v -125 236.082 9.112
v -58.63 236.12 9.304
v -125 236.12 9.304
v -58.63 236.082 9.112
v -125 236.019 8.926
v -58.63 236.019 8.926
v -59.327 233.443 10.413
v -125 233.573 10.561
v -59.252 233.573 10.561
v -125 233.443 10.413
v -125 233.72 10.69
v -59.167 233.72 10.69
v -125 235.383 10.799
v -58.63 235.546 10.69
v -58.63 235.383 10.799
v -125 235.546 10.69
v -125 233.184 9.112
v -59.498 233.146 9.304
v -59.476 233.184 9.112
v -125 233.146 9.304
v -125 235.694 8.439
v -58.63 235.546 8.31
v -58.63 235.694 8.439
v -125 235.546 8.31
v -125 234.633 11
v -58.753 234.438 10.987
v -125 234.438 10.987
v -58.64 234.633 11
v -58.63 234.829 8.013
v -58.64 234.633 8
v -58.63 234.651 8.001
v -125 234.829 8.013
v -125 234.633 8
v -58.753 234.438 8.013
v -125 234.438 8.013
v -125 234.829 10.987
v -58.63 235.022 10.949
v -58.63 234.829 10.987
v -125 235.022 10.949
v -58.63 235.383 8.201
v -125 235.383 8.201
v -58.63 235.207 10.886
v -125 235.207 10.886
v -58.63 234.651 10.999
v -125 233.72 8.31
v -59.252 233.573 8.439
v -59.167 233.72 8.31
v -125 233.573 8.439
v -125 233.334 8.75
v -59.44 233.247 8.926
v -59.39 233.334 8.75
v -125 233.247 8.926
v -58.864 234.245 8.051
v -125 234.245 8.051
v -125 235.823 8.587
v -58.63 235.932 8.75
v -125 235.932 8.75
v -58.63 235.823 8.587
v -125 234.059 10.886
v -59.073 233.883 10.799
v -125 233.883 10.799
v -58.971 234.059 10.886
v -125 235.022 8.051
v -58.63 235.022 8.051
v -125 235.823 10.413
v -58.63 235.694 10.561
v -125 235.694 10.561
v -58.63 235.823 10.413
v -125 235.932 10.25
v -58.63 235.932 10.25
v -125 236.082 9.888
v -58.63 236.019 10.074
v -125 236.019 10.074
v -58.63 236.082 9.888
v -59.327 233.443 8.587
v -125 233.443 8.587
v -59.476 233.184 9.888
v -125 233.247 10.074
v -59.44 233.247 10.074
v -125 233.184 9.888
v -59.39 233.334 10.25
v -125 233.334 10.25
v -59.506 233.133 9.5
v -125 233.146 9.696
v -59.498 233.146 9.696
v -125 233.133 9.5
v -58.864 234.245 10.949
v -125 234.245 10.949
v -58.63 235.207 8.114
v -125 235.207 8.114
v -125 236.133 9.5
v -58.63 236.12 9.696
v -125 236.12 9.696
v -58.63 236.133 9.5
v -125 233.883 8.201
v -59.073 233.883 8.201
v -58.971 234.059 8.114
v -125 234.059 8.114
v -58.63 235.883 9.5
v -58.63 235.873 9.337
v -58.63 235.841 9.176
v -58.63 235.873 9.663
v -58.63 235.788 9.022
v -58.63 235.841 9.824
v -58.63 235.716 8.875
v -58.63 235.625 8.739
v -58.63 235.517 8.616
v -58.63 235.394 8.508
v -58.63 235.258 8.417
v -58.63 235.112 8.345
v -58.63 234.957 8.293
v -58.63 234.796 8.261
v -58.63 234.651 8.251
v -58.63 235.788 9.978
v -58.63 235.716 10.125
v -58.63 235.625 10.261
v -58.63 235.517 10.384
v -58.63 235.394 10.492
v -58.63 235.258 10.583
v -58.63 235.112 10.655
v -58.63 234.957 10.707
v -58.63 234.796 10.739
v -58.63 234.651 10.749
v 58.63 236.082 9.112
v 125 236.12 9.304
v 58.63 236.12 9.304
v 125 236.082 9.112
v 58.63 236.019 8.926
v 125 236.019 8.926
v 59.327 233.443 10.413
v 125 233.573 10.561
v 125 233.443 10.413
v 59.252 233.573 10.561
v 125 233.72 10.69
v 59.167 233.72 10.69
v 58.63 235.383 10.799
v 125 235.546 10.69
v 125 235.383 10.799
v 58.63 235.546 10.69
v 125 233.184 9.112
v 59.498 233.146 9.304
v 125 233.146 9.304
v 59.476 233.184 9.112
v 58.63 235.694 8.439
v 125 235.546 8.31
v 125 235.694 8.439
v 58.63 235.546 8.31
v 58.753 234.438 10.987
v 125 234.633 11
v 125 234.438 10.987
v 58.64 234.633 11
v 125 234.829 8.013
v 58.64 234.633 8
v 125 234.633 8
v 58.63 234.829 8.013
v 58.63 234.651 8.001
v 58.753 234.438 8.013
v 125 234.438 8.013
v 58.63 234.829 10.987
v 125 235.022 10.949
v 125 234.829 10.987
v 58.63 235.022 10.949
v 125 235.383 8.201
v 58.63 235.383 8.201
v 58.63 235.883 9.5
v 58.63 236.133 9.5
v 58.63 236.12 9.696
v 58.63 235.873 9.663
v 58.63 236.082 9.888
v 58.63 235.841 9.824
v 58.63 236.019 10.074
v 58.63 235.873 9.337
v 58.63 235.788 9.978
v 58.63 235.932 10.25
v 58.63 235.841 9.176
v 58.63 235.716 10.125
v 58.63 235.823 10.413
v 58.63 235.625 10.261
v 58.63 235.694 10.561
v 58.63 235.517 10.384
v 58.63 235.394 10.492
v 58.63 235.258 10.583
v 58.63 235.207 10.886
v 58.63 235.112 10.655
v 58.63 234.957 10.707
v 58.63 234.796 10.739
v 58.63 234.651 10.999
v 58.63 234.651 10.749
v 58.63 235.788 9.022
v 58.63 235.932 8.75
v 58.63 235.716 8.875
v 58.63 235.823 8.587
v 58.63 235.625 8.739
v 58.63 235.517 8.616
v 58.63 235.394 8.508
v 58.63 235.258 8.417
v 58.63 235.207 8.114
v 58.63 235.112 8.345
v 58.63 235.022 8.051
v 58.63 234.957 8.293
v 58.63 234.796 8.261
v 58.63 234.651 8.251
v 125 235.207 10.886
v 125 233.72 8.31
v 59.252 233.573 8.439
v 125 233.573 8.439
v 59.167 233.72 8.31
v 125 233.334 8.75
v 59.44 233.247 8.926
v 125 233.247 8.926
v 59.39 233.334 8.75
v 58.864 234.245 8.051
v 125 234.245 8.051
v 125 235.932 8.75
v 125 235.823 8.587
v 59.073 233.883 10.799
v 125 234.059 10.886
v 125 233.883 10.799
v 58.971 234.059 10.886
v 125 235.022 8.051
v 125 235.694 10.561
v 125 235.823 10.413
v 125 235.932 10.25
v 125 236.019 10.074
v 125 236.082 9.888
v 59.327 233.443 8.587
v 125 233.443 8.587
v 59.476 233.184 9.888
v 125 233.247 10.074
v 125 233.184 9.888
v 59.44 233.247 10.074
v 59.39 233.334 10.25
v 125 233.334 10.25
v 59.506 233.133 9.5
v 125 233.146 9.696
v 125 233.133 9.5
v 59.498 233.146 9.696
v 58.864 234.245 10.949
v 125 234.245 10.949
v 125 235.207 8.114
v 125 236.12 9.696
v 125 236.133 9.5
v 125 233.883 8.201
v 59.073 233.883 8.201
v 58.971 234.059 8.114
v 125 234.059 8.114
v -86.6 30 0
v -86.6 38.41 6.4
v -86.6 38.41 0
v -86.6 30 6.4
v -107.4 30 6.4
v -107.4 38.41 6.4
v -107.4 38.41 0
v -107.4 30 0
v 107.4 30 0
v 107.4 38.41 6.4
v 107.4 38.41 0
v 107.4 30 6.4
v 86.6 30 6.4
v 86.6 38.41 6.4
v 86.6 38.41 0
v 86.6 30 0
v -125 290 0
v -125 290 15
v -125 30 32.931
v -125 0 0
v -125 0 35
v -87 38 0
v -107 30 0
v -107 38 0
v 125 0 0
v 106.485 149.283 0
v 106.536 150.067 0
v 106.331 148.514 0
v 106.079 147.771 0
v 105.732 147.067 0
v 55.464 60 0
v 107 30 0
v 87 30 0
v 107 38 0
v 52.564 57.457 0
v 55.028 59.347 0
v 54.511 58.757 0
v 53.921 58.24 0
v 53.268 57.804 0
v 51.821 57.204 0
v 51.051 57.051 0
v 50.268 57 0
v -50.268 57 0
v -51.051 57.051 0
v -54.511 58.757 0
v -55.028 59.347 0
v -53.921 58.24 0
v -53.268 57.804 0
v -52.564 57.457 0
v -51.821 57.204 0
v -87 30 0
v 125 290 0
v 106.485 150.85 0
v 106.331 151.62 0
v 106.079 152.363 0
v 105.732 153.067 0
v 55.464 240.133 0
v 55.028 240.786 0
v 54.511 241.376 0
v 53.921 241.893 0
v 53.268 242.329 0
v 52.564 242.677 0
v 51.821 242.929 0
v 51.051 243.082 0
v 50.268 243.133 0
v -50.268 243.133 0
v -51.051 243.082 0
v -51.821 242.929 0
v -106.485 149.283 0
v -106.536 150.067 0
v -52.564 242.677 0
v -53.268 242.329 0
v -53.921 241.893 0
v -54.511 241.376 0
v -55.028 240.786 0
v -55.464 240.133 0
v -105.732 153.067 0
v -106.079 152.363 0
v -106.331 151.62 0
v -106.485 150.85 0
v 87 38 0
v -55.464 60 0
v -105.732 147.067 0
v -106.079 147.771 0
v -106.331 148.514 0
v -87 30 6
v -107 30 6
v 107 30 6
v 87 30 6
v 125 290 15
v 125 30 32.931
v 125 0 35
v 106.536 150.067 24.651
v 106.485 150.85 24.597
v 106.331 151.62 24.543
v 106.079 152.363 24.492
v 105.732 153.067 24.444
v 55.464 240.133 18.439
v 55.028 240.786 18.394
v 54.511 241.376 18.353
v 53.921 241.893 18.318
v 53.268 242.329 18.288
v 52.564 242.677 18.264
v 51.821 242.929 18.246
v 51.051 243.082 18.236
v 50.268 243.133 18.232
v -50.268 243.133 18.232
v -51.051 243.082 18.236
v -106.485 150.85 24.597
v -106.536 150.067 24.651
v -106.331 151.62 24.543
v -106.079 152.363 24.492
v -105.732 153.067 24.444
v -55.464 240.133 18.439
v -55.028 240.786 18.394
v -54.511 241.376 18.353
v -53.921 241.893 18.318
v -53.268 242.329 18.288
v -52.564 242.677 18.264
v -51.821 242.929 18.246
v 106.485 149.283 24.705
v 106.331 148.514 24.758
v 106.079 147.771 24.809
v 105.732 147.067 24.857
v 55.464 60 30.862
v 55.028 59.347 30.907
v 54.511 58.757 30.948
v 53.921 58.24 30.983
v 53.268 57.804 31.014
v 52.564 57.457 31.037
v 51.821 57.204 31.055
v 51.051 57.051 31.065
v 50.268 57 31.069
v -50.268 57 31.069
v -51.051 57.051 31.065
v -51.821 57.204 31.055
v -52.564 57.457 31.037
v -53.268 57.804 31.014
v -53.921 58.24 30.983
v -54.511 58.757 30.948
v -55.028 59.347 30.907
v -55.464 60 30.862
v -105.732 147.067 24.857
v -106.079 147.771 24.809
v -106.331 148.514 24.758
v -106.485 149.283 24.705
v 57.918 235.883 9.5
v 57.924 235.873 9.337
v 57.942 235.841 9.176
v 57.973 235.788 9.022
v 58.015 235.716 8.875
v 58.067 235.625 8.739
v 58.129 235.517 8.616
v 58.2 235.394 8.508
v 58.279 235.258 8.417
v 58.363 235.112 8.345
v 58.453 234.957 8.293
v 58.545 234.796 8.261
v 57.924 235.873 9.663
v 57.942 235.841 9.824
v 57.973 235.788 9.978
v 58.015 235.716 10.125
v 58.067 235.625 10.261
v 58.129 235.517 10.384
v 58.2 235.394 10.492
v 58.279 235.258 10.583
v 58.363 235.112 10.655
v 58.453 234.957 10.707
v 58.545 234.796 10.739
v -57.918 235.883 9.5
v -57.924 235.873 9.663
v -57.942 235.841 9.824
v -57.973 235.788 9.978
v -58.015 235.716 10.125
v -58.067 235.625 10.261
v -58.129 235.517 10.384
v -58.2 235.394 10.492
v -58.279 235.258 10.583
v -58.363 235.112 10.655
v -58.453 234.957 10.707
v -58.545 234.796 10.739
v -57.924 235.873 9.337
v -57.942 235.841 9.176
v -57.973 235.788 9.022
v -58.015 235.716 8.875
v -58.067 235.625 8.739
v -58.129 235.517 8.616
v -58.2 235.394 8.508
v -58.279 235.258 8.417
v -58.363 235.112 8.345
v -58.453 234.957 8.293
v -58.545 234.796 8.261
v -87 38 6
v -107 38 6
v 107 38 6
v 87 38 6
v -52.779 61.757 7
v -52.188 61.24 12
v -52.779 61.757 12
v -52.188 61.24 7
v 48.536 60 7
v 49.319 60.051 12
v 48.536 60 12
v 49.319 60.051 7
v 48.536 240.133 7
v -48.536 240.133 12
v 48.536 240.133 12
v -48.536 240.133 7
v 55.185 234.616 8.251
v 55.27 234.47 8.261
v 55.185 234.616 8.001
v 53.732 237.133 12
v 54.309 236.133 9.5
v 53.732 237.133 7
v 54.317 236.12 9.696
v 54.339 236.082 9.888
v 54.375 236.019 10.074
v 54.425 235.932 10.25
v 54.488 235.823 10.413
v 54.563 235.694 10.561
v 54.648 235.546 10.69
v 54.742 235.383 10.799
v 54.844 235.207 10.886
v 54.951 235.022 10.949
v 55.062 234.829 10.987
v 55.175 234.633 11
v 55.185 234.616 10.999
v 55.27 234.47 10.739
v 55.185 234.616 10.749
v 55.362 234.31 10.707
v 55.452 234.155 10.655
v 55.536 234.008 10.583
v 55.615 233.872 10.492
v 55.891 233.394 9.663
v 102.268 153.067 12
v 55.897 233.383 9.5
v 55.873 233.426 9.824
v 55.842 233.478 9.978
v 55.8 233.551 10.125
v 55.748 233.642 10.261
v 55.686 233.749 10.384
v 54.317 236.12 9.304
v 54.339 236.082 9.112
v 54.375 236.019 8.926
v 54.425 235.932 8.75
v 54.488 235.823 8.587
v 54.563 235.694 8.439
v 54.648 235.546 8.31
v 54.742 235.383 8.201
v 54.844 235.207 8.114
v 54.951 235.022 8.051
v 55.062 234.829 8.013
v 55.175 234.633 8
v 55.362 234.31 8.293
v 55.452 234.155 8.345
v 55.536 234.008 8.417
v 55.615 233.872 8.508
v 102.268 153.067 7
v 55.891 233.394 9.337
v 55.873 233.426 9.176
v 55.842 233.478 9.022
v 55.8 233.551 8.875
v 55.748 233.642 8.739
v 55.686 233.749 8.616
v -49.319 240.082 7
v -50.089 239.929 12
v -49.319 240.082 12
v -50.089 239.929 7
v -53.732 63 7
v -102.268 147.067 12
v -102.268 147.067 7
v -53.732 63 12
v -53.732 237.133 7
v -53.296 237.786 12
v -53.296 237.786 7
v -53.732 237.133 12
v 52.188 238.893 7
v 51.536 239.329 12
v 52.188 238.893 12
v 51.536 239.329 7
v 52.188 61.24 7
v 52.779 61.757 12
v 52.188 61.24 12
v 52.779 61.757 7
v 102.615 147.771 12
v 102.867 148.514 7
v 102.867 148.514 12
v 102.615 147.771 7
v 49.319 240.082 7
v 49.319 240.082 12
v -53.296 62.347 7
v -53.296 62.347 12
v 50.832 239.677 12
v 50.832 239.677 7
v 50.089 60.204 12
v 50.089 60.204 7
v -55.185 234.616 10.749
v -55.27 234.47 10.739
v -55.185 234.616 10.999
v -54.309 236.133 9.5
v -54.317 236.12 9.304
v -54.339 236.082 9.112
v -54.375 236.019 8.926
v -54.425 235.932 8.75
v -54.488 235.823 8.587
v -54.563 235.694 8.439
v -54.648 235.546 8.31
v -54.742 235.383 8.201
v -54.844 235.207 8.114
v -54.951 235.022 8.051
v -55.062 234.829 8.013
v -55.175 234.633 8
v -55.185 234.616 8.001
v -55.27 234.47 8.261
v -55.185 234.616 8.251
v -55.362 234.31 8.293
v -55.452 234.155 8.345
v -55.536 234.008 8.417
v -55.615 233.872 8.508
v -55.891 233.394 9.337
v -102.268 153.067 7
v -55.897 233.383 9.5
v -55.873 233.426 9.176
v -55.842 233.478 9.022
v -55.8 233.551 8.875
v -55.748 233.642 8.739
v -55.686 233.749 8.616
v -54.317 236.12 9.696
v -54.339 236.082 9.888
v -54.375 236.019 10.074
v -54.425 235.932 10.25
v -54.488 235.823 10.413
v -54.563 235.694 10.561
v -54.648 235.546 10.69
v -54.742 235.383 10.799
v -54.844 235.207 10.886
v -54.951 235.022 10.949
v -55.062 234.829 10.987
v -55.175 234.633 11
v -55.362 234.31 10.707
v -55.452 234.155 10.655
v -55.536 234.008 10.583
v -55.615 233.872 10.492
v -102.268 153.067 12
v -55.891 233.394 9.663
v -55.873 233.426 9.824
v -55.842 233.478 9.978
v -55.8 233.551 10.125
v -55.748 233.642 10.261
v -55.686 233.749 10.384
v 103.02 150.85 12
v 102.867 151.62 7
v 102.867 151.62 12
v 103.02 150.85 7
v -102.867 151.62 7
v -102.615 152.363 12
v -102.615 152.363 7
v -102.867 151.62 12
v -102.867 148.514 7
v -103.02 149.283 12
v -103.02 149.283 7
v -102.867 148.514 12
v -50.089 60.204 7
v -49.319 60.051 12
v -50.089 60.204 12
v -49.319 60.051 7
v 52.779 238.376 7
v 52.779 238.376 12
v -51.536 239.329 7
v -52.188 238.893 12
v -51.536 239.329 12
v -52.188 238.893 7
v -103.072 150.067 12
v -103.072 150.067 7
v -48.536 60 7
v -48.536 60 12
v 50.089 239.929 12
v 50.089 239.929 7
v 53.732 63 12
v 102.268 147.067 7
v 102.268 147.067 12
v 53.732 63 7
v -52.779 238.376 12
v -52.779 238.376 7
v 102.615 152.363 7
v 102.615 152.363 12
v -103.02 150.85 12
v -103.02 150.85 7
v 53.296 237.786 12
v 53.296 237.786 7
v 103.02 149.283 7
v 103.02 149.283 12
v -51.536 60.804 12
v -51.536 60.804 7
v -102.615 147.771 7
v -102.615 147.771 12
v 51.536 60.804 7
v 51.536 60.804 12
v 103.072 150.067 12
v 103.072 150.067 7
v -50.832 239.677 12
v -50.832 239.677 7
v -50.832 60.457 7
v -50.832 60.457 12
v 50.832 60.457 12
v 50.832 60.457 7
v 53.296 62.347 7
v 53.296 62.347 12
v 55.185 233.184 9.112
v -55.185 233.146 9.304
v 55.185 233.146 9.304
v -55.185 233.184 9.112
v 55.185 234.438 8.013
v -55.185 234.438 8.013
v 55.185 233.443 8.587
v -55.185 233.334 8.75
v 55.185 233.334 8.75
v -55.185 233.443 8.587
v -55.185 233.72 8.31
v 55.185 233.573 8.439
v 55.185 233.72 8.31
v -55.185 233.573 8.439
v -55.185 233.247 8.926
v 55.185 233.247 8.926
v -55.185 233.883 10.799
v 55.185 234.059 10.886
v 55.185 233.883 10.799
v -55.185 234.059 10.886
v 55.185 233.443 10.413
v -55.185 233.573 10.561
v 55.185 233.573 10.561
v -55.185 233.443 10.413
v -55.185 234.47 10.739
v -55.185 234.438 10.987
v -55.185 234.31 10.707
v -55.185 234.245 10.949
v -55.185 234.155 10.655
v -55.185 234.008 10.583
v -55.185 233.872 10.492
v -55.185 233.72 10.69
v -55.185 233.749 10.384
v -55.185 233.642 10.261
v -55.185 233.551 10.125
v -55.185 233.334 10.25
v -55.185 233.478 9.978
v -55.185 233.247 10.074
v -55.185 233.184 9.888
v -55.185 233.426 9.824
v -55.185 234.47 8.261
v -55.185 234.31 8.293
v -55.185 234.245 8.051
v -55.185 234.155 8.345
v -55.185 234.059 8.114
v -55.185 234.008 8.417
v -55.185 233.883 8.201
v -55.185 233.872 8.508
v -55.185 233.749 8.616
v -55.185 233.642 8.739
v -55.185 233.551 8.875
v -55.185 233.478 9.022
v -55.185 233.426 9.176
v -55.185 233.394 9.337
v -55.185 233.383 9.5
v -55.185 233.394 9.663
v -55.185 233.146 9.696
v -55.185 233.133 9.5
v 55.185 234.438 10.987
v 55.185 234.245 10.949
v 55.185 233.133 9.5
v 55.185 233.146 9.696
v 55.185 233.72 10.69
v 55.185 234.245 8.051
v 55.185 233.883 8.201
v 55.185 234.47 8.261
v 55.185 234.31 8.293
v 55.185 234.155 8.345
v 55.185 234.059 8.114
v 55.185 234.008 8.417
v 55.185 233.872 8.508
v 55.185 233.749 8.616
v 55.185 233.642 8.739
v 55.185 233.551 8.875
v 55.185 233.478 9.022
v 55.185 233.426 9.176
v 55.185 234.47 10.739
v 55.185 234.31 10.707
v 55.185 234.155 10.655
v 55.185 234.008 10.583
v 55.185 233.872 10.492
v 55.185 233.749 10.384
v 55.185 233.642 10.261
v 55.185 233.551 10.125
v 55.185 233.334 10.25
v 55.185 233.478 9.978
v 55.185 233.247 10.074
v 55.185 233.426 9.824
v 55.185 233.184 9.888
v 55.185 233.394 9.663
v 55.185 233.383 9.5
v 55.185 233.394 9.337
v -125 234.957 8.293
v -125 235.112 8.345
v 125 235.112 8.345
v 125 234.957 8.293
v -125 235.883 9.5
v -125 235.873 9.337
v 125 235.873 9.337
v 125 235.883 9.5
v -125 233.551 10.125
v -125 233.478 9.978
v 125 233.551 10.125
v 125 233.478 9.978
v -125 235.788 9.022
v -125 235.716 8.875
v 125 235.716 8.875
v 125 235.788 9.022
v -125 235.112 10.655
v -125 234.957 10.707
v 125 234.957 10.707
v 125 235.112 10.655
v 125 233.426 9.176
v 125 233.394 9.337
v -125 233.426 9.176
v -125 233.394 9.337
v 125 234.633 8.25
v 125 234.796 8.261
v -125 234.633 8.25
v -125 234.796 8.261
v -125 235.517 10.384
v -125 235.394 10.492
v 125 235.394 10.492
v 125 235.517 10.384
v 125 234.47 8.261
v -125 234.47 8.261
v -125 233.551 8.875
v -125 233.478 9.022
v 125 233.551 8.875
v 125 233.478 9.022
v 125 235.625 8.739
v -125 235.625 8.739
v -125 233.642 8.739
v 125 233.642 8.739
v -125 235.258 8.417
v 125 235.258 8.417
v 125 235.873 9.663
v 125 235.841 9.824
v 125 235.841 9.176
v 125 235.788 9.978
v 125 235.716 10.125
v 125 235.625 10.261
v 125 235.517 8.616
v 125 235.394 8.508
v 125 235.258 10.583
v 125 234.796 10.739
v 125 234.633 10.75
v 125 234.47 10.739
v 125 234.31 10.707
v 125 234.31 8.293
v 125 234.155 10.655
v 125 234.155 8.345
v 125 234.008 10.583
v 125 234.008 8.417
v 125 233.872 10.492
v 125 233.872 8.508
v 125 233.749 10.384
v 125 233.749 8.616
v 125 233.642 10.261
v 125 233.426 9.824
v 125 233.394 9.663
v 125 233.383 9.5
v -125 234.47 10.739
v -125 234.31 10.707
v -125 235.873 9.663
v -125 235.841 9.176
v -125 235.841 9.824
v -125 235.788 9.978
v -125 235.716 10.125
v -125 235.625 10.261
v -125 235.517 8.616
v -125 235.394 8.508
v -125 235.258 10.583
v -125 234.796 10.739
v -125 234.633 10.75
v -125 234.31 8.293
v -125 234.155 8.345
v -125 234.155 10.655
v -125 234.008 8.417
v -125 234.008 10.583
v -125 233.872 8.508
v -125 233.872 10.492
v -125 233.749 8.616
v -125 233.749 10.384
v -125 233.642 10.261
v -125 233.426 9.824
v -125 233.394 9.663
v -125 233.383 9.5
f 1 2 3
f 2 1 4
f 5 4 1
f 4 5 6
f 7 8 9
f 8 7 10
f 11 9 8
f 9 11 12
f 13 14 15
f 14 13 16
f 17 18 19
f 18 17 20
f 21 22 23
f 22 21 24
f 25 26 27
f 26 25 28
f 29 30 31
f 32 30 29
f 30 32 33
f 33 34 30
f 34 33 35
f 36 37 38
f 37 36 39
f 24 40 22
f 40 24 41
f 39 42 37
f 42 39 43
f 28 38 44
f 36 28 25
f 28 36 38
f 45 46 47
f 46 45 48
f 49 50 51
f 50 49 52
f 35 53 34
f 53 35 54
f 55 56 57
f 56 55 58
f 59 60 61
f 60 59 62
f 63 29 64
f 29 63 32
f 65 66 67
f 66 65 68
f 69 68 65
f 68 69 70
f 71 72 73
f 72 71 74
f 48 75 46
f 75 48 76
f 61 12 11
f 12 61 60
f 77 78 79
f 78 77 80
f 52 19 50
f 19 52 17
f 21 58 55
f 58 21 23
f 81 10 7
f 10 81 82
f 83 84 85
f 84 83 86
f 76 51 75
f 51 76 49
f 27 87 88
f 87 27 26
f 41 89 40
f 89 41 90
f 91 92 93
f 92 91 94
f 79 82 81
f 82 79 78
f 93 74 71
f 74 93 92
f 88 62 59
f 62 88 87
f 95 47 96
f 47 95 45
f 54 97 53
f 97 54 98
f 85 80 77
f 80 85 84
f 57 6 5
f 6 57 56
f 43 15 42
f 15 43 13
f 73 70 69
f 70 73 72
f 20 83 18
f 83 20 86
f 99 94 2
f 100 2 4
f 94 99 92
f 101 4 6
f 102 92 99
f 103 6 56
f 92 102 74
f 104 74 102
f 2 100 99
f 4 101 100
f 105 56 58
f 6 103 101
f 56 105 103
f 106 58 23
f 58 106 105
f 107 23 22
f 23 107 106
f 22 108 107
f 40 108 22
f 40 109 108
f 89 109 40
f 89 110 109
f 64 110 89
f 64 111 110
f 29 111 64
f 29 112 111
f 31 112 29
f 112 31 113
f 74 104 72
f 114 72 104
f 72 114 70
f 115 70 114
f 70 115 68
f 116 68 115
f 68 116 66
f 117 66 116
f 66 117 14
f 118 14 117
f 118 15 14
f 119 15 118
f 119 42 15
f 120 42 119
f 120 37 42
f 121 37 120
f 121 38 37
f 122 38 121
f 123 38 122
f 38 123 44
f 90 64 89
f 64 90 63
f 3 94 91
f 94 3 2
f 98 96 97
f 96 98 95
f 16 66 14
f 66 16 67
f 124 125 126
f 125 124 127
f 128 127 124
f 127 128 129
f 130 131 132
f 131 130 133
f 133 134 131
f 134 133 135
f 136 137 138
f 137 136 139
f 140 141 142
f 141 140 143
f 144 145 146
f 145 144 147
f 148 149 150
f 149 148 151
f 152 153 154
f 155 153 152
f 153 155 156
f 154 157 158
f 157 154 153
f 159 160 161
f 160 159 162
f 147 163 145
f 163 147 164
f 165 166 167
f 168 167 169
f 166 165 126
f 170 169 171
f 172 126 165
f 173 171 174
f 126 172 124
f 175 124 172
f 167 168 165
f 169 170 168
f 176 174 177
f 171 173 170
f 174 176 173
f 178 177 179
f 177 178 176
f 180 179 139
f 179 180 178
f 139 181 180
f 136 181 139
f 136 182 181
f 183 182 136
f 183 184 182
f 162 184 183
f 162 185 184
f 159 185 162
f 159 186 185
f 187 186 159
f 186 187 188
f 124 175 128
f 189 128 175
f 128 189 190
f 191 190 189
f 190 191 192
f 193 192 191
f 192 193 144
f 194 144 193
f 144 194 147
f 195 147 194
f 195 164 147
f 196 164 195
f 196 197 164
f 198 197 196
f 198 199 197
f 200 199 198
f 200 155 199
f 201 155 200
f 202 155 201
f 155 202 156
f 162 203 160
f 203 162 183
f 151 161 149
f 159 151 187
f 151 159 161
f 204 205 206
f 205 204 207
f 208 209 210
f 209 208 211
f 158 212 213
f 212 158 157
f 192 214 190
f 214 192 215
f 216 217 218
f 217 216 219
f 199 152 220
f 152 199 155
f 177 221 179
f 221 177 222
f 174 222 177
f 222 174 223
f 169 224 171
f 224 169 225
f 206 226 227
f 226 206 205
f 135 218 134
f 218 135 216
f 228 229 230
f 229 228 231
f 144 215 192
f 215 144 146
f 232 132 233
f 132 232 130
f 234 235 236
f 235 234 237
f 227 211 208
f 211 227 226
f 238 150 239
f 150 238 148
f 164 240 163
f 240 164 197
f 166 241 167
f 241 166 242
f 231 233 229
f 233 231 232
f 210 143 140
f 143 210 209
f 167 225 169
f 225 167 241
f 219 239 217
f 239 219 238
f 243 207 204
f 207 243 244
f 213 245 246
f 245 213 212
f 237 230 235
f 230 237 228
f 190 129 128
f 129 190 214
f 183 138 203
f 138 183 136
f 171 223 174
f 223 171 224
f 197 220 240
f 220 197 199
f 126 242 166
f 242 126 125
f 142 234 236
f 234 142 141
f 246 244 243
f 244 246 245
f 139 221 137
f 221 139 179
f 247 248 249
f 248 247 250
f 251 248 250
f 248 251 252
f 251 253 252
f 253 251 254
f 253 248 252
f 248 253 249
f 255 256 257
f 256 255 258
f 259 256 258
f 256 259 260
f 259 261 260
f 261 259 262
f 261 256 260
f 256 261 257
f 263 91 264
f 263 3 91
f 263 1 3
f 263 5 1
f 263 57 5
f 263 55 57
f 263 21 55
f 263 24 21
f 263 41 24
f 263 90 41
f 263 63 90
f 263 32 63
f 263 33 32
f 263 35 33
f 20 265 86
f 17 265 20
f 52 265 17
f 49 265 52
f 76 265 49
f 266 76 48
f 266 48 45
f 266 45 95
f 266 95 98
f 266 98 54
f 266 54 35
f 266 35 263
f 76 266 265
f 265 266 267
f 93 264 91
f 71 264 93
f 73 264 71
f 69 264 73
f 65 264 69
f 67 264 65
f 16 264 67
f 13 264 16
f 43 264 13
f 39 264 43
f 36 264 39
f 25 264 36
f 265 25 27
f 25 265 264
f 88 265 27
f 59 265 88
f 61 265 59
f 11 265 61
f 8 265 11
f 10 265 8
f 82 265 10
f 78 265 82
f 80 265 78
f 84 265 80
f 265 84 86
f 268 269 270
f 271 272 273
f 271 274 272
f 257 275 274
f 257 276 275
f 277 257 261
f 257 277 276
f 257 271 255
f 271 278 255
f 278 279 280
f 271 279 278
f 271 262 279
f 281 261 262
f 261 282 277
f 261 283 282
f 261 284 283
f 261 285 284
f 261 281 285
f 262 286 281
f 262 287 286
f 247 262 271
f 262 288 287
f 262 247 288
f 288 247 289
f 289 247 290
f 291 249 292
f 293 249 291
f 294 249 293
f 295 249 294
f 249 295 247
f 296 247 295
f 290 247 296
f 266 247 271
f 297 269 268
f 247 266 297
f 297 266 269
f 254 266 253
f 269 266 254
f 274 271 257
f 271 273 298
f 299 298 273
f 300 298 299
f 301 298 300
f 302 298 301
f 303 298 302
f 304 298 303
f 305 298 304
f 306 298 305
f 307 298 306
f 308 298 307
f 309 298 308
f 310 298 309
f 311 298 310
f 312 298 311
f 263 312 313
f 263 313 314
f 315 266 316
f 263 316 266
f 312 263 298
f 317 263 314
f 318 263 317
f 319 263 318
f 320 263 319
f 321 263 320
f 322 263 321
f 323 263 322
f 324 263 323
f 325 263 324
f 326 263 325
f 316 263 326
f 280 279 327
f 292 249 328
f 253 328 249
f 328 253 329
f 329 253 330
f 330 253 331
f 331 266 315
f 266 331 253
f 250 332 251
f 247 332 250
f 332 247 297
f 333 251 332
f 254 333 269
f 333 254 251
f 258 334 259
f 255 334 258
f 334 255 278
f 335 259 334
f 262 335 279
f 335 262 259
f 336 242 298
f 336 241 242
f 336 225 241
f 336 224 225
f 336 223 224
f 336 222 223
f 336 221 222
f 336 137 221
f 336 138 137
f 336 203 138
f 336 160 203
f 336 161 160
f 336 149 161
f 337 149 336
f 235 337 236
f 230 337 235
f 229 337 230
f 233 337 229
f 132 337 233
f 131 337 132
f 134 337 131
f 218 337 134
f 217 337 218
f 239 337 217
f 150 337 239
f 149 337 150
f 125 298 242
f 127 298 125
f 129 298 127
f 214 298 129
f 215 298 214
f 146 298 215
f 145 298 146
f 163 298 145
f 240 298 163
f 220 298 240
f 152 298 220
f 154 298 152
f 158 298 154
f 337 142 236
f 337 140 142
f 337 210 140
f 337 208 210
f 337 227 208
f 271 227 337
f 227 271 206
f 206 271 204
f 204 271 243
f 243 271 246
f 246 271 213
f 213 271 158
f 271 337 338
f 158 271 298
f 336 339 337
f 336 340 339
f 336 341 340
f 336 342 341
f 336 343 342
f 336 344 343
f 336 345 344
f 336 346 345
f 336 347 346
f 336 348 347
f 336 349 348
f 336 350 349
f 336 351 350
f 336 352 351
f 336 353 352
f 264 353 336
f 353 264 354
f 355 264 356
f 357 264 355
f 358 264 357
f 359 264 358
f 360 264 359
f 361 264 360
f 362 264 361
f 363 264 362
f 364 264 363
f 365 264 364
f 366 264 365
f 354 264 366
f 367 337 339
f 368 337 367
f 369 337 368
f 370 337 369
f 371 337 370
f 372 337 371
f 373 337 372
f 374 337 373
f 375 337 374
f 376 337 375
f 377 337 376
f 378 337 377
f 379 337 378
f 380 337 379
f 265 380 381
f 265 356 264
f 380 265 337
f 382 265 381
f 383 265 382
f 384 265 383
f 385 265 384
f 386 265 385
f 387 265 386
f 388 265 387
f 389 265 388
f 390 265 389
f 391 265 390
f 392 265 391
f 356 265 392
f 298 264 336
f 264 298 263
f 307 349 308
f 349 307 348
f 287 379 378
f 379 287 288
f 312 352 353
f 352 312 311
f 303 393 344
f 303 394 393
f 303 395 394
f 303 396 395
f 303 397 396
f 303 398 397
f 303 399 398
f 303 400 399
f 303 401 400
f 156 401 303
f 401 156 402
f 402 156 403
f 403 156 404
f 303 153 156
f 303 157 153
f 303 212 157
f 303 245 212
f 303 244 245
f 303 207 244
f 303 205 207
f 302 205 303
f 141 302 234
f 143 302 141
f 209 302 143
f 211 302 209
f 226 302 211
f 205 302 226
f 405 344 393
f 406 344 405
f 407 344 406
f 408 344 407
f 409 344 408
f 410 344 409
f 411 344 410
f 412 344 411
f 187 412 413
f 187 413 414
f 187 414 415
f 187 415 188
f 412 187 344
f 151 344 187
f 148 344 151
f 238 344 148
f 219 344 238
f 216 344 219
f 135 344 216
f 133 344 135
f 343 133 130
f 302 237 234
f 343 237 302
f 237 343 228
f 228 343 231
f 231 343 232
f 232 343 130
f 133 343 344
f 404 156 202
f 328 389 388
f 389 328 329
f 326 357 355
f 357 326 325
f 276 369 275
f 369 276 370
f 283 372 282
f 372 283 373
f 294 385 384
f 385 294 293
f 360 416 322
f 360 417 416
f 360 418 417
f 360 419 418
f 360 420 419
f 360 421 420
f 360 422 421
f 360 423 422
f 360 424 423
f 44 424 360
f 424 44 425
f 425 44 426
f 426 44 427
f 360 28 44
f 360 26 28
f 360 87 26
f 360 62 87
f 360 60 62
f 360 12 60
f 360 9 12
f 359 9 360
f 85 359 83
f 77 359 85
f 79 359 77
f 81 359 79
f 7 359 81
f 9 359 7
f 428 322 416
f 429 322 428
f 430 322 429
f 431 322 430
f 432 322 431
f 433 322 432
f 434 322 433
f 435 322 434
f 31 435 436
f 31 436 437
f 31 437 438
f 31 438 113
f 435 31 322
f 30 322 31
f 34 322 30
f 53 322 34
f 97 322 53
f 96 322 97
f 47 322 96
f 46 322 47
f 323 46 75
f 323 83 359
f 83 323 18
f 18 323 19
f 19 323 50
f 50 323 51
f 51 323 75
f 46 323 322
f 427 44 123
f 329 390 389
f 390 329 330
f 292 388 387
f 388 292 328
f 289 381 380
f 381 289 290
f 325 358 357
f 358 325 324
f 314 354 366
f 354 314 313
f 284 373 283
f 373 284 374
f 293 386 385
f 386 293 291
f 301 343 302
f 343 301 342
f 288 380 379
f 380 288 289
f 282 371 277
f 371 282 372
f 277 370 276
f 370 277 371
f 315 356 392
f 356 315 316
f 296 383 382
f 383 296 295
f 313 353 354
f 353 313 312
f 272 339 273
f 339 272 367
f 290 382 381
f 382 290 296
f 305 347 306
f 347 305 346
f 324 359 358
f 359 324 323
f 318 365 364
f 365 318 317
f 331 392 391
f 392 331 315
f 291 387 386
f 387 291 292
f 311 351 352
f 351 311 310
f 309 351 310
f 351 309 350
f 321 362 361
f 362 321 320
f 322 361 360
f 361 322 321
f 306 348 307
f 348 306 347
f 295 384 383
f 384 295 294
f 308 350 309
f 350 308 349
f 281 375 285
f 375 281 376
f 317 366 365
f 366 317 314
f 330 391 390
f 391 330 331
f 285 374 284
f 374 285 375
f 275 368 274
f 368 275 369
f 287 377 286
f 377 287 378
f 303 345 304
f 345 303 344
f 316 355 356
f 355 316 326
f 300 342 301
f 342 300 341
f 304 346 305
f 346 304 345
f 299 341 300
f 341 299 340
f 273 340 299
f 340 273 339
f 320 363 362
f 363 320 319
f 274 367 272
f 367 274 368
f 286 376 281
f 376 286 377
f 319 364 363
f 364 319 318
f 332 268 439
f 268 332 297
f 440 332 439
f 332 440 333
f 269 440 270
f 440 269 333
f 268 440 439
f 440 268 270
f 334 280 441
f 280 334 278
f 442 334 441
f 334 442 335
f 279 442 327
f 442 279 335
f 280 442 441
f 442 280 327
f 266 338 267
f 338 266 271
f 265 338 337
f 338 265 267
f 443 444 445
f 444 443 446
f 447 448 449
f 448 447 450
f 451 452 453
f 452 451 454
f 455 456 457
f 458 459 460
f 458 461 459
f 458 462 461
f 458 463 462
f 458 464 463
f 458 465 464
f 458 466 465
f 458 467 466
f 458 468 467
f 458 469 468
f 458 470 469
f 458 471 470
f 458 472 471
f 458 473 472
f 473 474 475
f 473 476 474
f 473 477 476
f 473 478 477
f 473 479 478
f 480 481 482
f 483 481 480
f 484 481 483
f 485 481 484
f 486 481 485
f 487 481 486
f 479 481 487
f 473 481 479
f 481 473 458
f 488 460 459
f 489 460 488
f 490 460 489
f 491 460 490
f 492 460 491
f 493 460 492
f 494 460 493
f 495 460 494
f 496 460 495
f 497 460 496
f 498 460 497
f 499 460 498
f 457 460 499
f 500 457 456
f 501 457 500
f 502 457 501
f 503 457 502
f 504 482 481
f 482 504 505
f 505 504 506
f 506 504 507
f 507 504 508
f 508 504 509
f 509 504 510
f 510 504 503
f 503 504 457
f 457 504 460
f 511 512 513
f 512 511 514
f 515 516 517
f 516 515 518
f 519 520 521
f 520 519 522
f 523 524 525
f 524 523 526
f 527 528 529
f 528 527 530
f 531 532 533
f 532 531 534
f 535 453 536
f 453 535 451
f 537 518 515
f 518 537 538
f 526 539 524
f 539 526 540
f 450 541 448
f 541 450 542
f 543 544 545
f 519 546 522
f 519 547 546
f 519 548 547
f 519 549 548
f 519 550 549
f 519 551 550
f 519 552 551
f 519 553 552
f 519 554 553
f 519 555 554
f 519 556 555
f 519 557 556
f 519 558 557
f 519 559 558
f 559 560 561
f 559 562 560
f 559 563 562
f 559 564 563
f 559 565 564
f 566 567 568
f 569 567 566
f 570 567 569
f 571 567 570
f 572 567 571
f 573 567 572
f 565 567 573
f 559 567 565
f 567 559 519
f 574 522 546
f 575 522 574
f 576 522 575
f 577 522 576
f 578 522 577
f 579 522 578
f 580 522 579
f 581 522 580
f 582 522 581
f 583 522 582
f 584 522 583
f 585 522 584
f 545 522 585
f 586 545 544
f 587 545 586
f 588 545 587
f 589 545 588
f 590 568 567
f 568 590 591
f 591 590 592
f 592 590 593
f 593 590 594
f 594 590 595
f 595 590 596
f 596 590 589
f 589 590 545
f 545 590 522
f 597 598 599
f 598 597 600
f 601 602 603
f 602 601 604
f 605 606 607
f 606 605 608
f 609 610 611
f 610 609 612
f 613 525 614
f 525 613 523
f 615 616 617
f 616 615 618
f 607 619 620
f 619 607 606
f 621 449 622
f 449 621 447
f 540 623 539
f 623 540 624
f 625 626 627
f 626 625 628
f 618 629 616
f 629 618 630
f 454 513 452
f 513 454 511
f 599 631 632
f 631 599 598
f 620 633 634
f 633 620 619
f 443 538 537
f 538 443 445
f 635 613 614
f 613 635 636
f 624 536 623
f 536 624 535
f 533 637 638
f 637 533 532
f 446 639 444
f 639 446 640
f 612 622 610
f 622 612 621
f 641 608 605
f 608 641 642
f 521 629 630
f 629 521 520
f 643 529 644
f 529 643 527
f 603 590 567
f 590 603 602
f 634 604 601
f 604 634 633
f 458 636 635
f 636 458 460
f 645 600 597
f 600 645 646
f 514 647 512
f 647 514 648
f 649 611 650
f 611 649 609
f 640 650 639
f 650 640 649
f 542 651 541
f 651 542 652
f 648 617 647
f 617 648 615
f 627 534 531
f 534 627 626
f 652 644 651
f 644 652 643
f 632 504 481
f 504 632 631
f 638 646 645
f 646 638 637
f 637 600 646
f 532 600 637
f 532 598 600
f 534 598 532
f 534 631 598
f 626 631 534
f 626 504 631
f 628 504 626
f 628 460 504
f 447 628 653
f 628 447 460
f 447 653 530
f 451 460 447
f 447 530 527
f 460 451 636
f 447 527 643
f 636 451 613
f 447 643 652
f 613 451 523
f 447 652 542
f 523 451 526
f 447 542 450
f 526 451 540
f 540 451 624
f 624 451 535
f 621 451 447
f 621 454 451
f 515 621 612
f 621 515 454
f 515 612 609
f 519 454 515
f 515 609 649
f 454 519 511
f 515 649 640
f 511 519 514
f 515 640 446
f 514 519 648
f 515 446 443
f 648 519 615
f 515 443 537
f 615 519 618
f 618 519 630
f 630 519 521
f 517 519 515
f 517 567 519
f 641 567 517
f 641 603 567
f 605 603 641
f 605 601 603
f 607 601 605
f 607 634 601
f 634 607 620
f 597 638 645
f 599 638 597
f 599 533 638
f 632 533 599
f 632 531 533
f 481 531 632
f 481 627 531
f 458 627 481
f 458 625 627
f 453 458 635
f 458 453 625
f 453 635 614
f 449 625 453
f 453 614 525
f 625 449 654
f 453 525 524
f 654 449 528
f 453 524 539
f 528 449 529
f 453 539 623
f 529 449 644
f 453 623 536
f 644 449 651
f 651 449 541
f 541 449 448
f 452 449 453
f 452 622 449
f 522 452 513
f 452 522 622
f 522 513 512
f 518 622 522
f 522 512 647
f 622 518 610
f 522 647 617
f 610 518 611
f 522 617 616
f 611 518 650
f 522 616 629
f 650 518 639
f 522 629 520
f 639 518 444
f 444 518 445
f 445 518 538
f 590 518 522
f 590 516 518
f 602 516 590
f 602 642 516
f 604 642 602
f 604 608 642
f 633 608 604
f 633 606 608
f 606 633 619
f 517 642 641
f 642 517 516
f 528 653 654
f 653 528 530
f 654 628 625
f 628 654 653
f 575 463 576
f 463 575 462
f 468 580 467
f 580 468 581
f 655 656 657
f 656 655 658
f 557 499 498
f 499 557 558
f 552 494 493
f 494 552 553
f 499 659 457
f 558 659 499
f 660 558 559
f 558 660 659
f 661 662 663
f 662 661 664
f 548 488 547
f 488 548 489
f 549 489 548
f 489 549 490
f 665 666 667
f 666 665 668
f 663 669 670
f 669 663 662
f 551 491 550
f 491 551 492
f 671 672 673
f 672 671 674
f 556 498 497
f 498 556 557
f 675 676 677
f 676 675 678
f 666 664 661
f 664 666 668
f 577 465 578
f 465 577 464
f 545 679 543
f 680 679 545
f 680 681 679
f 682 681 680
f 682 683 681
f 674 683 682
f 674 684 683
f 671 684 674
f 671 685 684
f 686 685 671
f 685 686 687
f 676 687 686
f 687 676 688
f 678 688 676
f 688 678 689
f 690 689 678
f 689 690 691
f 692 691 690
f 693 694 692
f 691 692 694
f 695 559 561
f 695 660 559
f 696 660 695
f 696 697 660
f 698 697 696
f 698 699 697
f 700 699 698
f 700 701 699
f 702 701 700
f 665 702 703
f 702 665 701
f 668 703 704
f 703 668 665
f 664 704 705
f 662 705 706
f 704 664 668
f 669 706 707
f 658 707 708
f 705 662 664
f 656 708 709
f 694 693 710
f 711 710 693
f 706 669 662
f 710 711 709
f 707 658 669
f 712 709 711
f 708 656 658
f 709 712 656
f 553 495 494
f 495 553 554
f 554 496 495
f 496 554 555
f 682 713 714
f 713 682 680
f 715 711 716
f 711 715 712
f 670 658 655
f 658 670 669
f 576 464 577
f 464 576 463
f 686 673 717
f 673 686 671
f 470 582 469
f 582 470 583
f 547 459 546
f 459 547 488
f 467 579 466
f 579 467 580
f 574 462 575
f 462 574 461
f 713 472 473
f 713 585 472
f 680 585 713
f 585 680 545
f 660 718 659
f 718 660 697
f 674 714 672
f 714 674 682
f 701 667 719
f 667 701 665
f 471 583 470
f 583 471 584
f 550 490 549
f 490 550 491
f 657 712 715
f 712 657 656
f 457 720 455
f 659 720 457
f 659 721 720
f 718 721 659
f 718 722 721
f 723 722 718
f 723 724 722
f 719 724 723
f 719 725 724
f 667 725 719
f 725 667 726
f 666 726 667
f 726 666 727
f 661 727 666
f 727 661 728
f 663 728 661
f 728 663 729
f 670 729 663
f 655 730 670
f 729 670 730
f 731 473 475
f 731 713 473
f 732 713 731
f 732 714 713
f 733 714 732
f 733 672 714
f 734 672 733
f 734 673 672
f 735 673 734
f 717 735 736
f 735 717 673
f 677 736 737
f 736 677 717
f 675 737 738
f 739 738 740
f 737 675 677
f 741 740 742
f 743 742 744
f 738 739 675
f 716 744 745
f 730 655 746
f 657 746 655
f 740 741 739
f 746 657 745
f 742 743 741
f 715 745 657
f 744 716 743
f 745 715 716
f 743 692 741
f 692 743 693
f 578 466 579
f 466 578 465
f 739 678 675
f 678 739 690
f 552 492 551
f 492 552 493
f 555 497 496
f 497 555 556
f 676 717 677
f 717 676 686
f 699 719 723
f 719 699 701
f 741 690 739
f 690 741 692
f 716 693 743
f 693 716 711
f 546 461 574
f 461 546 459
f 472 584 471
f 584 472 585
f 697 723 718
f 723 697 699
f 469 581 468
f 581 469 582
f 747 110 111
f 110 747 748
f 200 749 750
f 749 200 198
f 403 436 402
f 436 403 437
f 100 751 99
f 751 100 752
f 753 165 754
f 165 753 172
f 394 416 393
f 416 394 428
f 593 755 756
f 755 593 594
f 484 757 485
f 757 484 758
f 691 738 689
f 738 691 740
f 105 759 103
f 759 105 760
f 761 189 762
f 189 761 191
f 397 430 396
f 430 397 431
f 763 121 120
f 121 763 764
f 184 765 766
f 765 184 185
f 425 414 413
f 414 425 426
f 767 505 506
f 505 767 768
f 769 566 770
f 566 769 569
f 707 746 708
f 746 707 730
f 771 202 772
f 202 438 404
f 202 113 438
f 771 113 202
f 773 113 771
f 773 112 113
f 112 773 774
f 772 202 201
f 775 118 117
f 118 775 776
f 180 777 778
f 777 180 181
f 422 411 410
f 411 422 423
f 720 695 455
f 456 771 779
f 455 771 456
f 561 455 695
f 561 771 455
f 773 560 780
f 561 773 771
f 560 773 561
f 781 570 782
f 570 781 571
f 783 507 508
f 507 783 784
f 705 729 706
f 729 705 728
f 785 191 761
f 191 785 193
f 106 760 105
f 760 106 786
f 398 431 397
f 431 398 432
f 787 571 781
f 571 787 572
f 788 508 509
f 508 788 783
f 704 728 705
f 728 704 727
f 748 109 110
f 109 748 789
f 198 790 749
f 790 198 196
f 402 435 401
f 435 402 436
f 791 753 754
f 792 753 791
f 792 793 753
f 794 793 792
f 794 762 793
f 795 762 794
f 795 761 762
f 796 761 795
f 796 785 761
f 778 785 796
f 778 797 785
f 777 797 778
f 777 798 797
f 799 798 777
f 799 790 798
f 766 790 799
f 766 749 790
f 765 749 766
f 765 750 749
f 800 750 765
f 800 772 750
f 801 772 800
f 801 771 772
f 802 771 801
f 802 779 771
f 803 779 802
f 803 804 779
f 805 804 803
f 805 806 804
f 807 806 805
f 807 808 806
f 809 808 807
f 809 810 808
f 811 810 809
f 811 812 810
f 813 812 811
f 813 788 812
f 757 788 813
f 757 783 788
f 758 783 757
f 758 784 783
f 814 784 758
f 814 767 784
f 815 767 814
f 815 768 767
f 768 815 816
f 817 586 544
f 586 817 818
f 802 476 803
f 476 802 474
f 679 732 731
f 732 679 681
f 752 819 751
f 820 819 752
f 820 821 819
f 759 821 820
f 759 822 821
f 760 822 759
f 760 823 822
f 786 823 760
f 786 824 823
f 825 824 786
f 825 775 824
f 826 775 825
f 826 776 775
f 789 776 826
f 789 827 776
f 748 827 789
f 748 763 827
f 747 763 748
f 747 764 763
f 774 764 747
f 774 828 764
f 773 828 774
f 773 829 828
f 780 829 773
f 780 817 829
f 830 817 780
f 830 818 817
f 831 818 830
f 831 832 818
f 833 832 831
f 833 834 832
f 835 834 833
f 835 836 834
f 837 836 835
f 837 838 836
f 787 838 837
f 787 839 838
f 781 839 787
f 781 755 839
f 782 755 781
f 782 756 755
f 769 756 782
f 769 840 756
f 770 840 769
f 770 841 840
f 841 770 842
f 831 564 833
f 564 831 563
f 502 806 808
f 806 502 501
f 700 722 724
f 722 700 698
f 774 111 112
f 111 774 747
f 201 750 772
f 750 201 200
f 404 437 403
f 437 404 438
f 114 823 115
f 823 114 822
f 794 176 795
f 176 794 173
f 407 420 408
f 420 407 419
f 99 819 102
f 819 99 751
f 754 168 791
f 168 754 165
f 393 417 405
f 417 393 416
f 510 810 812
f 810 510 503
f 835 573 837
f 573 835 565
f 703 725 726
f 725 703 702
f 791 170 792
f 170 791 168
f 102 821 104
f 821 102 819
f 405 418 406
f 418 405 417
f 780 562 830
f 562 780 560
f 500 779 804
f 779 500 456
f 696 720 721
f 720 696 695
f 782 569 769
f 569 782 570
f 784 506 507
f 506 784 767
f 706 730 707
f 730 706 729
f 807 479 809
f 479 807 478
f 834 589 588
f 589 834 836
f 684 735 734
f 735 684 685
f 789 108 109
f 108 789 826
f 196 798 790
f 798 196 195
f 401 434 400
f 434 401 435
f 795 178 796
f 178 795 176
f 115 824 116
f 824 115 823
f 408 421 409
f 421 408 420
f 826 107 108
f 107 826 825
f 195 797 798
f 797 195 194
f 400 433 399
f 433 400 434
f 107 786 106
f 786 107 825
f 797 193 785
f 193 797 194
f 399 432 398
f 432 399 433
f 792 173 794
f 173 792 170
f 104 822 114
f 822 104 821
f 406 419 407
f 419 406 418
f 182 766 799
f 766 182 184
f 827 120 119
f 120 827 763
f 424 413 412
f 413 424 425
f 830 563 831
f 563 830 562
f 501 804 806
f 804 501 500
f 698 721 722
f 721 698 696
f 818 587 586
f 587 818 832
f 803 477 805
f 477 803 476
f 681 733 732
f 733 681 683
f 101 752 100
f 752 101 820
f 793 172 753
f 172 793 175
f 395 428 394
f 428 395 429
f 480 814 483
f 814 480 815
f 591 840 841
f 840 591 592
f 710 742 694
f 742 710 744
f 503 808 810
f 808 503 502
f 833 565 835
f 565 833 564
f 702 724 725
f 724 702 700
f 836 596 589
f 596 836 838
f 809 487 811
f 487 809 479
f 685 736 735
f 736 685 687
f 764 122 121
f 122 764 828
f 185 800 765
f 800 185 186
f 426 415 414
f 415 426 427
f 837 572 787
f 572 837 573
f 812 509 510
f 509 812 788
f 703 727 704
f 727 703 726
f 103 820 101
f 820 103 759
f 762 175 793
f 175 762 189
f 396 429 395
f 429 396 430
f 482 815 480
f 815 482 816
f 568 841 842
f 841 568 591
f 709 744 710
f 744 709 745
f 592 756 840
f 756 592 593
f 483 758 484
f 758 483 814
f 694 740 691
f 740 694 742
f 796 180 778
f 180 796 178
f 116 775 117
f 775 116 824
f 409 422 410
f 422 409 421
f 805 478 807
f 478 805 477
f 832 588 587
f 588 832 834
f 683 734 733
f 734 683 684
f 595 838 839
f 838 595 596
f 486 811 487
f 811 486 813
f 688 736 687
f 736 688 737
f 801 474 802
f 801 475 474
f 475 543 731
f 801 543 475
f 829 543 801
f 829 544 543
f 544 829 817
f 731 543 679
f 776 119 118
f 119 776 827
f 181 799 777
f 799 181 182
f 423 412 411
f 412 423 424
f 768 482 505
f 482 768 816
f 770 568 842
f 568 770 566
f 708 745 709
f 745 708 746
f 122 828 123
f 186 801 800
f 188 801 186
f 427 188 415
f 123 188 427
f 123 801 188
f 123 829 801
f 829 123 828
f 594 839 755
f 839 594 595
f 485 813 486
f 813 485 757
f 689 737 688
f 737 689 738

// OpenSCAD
// Parametric cat door in millimeters.
// Includes a split rectangular frame, a rounded hexagonal door, optional hex screen,
// aligned 3 mm hinge-axis holes, and a separate 250 mm x 2.5 mm rod.

$fn = 48;
eps = 0.01;

// Overall frame dimensions.
frame_width_mm = 250;
frame_total_height_mm = 290;
frame_top_section_height_mm = 260;
frame_bottom_extension_height_mm = 30;

// Frame depth profile.
frame_top_depth_mm = 15;
frame_bottom_depth_mm = 35;

// Door and opening controls.
door_thickness_mm = 5;
frame_side_margin_mm = 18;
frame_top_margin_mm = 18;
bottom_swing_clearance_mm = 40;
door_vertical_offset_mm = 20;
clearance_mm = 3;
door_edge_frame_mm = 10;
hex_corner_radius_mm = 6;

// Screen pattern controls.
disable_hex_grid = true;
screen_hole_mm = 2;
screen_web_mm = 0.5;

// Hinge-axis hole controls.
alignment_hole_diameter_mm = 3;
alignment_hole_top_margin_mm = 4;
alignment_hole_z_offset_mm = 7;

// Separate rod.
hinge_rod_length_mm = 250;
hinge_rod_diameter_mm = 2.5;

// Split-joint controls for the 30 mm bottom extension.
joint_tongue_width_mm = 20;
joint_tongue_height_mm = 8;
joint_tongue_depth_mm = 6;
joint_tongue_clearance_mm = 0.4;
joint_side_inset_mm = 18;

// Display controls.
render_object = "assembled"; // "assembled", "top", "door", "top-and-door", "bottom", "rod", "bottom-and-rod"
layout_gap_mm = 20;
show_hinge_rod = true;

split_y_mm = frame_bottom_extension_height_mm;
max_frame_depth_mm = max(frame_top_depth_mm, frame_bottom_depth_mm);
sqrt3 = sqrt(3);

function frame_depth_at_y(y_pos) =
    frame_bottom_depth_mm
    - ((frame_bottom_depth_mm - frame_top_depth_mm) * (y_pos / frame_total_height_mm));

available_door_width_mm = frame_width_mm - (2 * frame_side_margin_mm) - (2 * clearance_mm);
available_door_height_mm = frame_total_height_mm - bottom_swing_clearance_mm - frame_top_margin_mm - clearance_mm;

// Flat-top regular hexagon: width = 2r, height = sqrt(3) * r.
door_radius_mm = min(
    available_door_width_mm / 2,
    available_door_height_mm / sqrt3
);

door_half_height_mm = (sqrt3 / 2) * door_radius_mm;
door_center_y_mm = bottom_swing_clearance_mm + door_half_height_mm + door_vertical_offset_mm;
door_top_local_y_mm = door_half_height_mm;

frame_opening_radius_mm = door_radius_mm + ((2 * clearance_mm) / sqrt3);
frame_opening_half_height_mm = (sqrt3 / 2) * frame_opening_radius_mm;
frame_opening_bottom_y_mm = door_center_y_mm - frame_opening_half_height_mm;
frame_opening_top_y_mm = door_center_y_mm + frame_opening_half_height_mm;

alignment_hole_radius_mm = alignment_hole_diameter_mm / 2;
alignment_hole_local_y_mm = door_top_local_y_mm - alignment_hole_radius_mm - alignment_hole_top_margin_mm;
alignment_hole_global_y_mm = door_center_y_mm + alignment_hole_local_y_mm;
alignment_hole_local_z_mm = door_thickness_mm / 2;
alignment_hole_global_z_mm = alignment_hole_local_z_mm + alignment_hole_z_offset_mm;

door_hole_half_width_mm = door_radius_mm - (abs(alignment_hole_local_y_mm) / sqrt3);
frame_opening_half_width_mm = frame_opening_radius_mm - (abs(alignment_hole_local_y_mm) / sqrt3);
frame_side_hole_length_mm = (frame_width_mm / 2) - frame_opening_half_width_mm;
frame_side_hole_center_x_mm = (frame_opening_half_width_mm + (frame_width_mm / 2)) / 2;

joint_center_x_mm = (frame_width_mm / 2) - joint_side_inset_mm - (joint_tongue_width_mm / 2);
joint_groove_depth_mm = joint_tongue_depth_mm + joint_tongue_clearance_mm;
joint_groove_width_mm = joint_tongue_width_mm + (2 * joint_tongue_clearance_mm);
joint_groove_height_mm = joint_tongue_height_mm + joint_tongue_clearance_mm;

assert(
    frame_top_section_height_mm + frame_bottom_extension_height_mm == frame_total_height_mm,
    "Top section height plus bottom extension height must equal total frame height."
);
assert(frame_width_mm > 0, "frame_width_mm must be positive.");
assert(frame_total_height_mm > 0, "frame_total_height_mm must be positive.");
assert(frame_top_depth_mm > 0, "frame_top_depth_mm must be positive.");
assert(frame_bottom_depth_mm > 0, "frame_bottom_depth_mm must be positive.");
assert(door_thickness_mm > 0, "door_thickness_mm must be positive.");
assert(door_thickness_mm <= frame_top_depth_mm, "door_thickness_mm must fit within the top frame thickness.");
assert(clearance_mm >= 0, "clearance_mm must be zero or positive.");
assert(bottom_swing_clearance_mm > 0, "bottom_swing_clearance_mm must be positive.");
assert(door_vertical_offset_mm >= 0, "door_vertical_offset_mm must be zero or positive.");
assert(door_radius_mm > 0, "The current dimensions leave no room for the door.");
assert(hex_corner_radius_mm >= 0, "hex_corner_radius_mm must be zero or positive.");
assert(
    hex_corner_radius_mm < ((sqrt3 / 2) * door_radius_mm),
    "hex_corner_radius_mm is too large for the hexagon size."
);
assert(
    door_edge_frame_mm < ((sqrt3 / 2) * door_radius_mm),
    "door_edge_frame_mm is too large for the hexagonal door."
);
assert(frame_opening_bottom_y_mm >= split_y_mm, "The frame opening extends into the bottom extension section.");
assert(frame_opening_top_y_mm <= frame_total_height_mm, "The frame opening extends above the frame.");
assert(screen_hole_mm > 0, "screen_hole_mm must be positive.");
assert(screen_web_mm >= 0, "screen_web_mm must be zero or positive.");
assert(alignment_hole_diameter_mm > 0, "alignment_hole_diameter_mm must be positive.");
assert(
    alignment_hole_diameter_mm <= door_thickness_mm,
    "alignment_hole_diameter_mm must fit within the door thickness."
);
assert(
    alignment_hole_global_z_mm - alignment_hole_radius_mm >= 0,
    "alignment_hole_z_offset_mm places the hole below the frame front face."
);
assert(
    alignment_hole_global_z_mm + alignment_hole_radius_mm <= frame_depth_at_y(alignment_hole_global_y_mm),
    "alignment_hole_z_offset_mm places the hole outside the frame thickness at the hinge-axis height."
);
assert(
    alignment_hole_local_y_mm + alignment_hole_radius_mm <= door_top_local_y_mm,
    "alignment hole is above the top side of the hex door."
);
assert(door_hole_half_width_mm > 0, "alignment hole is too high for the hex door.");
assert(frame_side_hole_length_mm > 0, "alignment hole does not intersect the frame sides.");
assert(joint_tongue_width_mm > 0, "joint_tongue_width_mm must be positive.");
assert(joint_tongue_height_mm > 0, "joint_tongue_height_mm must be positive.");
assert(joint_tongue_depth_mm > 0, "joint_tongue_depth_mm must be positive.");
assert(joint_tongue_clearance_mm >= 0, "joint_tongue_clearance_mm must be zero or positive.");
assert(joint_center_x_mm - (joint_tongue_width_mm / 2) > 0, "Joint tongues extend beyond the frame width.");

module hexagon_2d(radius) {
    polygon(points = [
        [ radius, 0],
        [ radius / 2,  (sqrt3 / 2) * radius],
        [-radius / 2,  (sqrt3 / 2) * radius],
        [-radius, 0],
        [-radius / 2, -(sqrt3 / 2) * radius],
        [ radius / 2, -(sqrt3 / 2) * radius]
    ]);
}

module rounded_hexagon_2d(radius, corner_radius_mm) {
    if (corner_radius_mm > 0)
        offset(r = corner_radius_mm)
            offset(delta = -corner_radius_mm)
                hexagon_2d(radius);
    else
        hexagon_2d(radius);
}

module honeycomb_holes_2d(bounds_radius, hole_flat_mm, web_mm) {
    hole_radius_mm = hole_flat_mm / sqrt3;
    cell_radius_mm = (hole_flat_mm + web_mm) / sqrt3;
    q_limit = ceil((bounds_radius * 2) / (1.5 * cell_radius_mm)) + 2;
    r_limit = ceil((bounds_radius * 2) / (sqrt3 * cell_radius_mm)) + 2;

    union() {
        for (q = [-q_limit : q_limit]) {
            for (r = [-r_limit : r_limit]) {
                translate([
                    1.5 * cell_radius_mm * q,
                    sqrt3 * cell_radius_mm * (r + (q / 2))
                ])
                    hexagon_2d(hole_radius_mm);
            }
        }
    }
}

module x_cylinder(length_mm, diameter_mm) {
    rotate([0, 90, 0])
        cylinder(h = length_mm, d = diameter_mm, center = true);
}

module frame_section_body(y_min_mm, y_max_mm) {
    depth_min_mm = frame_depth_at_y(y_min_mm);
    depth_max_mm = frame_depth_at_y(y_max_mm);

    rotate([0, 90, 0])
        linear_extrude(height = frame_width_mm, center = true, convexity = 10)
            polygon(points = [
                [0, y_min_mm],
                [0, y_max_mm],
                [-depth_max_mm, y_max_mm],
                [-depth_min_mm, y_min_mm]
            ]);
}

module door_panel_2d() {
    rounded_hexagon_2d(door_radius_mm, hex_corner_radius_mm);
}

module frame_opening_2d() {
    rounded_hexagon_2d(frame_opening_radius_mm, hex_corner_radius_mm);
}

module door_screen_region_2d() {
    offset(delta = -door_edge_frame_mm)
        door_panel_2d();
}

module door_alignment_hole_cut() {
    translate([0, alignment_hole_local_y_mm, alignment_hole_local_z_mm])
        x_cylinder((2 * door_hole_half_width_mm) + (2 * eps), alignment_hole_diameter_mm);
}

module frame_alignment_hole_cut() {
    union() {
        translate([-frame_side_hole_center_x_mm, alignment_hole_global_y_mm, alignment_hole_global_z_mm])
            x_cylinder(frame_side_hole_length_mm + (2 * eps), alignment_hole_diameter_mm);

        translate([ frame_side_hole_center_x_mm, alignment_hole_global_y_mm, alignment_hole_global_z_mm])
            x_cylinder(frame_side_hole_length_mm + (2 * eps), alignment_hole_diameter_mm);
    }
}

module bottom_extension_tongues() {
    union() {
        translate([
            -joint_center_x_mm - (joint_tongue_width_mm / 2),
            split_y_mm - eps,
            0
        ])
            cube([joint_tongue_width_mm, joint_tongue_height_mm + eps, joint_tongue_depth_mm]);

        translate([
             joint_center_x_mm - (joint_tongue_width_mm / 2),
            split_y_mm - eps,
            0
        ])
            cube([joint_tongue_width_mm, joint_tongue_height_mm + eps, joint_tongue_depth_mm]);
    }
}

module top_section_grooves() {
    union() {
        translate([
            -joint_center_x_mm - (joint_groove_width_mm / 2),
            split_y_mm - eps,
            -eps
        ])
            cube([joint_groove_width_mm, joint_groove_height_mm + (2 * eps), joint_groove_depth_mm + eps]);

        translate([
             joint_center_x_mm - (joint_groove_width_mm / 2),
            split_y_mm - eps,
            -eps
        ])
            cube([joint_groove_width_mm, joint_groove_height_mm + (2 * eps), joint_groove_depth_mm + eps]);
    }
}

module top_frame_part() {
    color([0.18, 0.65, 0.22])
        difference() {
            frame_section_body(split_y_mm, frame_total_height_mm);

            translate([0, door_center_y_mm, -eps])
                linear_extrude(height = max_frame_depth_mm + (2 * eps), convexity = 10)
                    frame_opening_2d();

            frame_alignment_hole_cut();
            top_section_grooves();
        }
}

module bottom_extension_part() {
    color([0.82, 0.18, 0.18])
        union() {
            frame_section_body(0, split_y_mm);
            bottom_extension_tongues();
        }
}

module door_part() {
    color([0.78, 0.80, 0.84])
        translate([0, door_center_y_mm, alignment_hole_z_offset_mm])
            difference() {
                linear_extrude(height = door_thickness_mm, convexity = 10)
                    door_panel_2d();

                if (!disable_hex_grid)
                    translate([0, 0, -eps])
                        linear_extrude(height = door_thickness_mm + (2 * eps), convexity = 10)
                            intersection() {
                                door_screen_region_2d();
                                honeycomb_holes_2d(
                                    bounds_radius = door_radius_mm,
                                    hole_flat_mm = screen_hole_mm,
                                    web_mm = screen_web_mm
                                );
                            }

                door_alignment_hole_cut();
            }
}

module hinge_rod_part() {
    color([0.70, 0.12, 0.12])
        x_cylinder(hinge_rod_length_mm, hinge_rod_diameter_mm);
}

module assembled_view() {
    top_frame_part();
    bottom_extension_part();
    door_part();

    if (show_hinge_rod)
        translate([0, alignment_hole_global_y_mm, alignment_hole_global_z_mm])
            hinge_rod_part();
}

module top_frame_on_bed() {
    translate([0, 0, max_frame_depth_mm])
        top_frame_part();
}

module bottom_frame_on_bed() {
    translate([0, 0, frame_bottom_depth_mm])
        bottom_extension_part();
}

module door_on_bed() {
    translate([0, 0, -alignment_hole_z_offset_mm])
        door_part();
}

module top_and_door_printable() {
    translate([0, 0, 0])
        top_frame_on_bed();

    translate([0, -(door_center_y_mm - door_half_height_mm + layout_gap_mm), -alignment_hole_z_offset_mm])
        door_part();
}

module bottom_printable() {
    bottom_frame_on_bed();
}

module door_printable() {
    door_on_bed();
}

module rod_printable() {
    translate([0, 0, hinge_rod_diameter_mm / 2])
        hinge_rod_part();
}

module bottom_and_rod_printable() {
    bottom_frame_on_bed();

    translate([0, -(layout_gap_mm + (hinge_rod_diameter_mm / 2)), 0])
        rod_printable();
}

if (render_object == "assembled")
    assembled_view();
else if (render_object == "top")
    top_frame_on_bed();
else if (render_object == "door")
    door_printable();
else if (render_object == "top-and-door")
    top_and_door_printable();
else if (render_object == "bottom")
    bottom_printable();
else if (render_object == "rod")
    rod_printable();
else if (render_object == "bottom-and-rod")
    bottom_and_rod_printable();
else
    assert(false, "render_object must be one of: assembled, top, door, top-and-door, bottom, rod, bottom-and-rod");
